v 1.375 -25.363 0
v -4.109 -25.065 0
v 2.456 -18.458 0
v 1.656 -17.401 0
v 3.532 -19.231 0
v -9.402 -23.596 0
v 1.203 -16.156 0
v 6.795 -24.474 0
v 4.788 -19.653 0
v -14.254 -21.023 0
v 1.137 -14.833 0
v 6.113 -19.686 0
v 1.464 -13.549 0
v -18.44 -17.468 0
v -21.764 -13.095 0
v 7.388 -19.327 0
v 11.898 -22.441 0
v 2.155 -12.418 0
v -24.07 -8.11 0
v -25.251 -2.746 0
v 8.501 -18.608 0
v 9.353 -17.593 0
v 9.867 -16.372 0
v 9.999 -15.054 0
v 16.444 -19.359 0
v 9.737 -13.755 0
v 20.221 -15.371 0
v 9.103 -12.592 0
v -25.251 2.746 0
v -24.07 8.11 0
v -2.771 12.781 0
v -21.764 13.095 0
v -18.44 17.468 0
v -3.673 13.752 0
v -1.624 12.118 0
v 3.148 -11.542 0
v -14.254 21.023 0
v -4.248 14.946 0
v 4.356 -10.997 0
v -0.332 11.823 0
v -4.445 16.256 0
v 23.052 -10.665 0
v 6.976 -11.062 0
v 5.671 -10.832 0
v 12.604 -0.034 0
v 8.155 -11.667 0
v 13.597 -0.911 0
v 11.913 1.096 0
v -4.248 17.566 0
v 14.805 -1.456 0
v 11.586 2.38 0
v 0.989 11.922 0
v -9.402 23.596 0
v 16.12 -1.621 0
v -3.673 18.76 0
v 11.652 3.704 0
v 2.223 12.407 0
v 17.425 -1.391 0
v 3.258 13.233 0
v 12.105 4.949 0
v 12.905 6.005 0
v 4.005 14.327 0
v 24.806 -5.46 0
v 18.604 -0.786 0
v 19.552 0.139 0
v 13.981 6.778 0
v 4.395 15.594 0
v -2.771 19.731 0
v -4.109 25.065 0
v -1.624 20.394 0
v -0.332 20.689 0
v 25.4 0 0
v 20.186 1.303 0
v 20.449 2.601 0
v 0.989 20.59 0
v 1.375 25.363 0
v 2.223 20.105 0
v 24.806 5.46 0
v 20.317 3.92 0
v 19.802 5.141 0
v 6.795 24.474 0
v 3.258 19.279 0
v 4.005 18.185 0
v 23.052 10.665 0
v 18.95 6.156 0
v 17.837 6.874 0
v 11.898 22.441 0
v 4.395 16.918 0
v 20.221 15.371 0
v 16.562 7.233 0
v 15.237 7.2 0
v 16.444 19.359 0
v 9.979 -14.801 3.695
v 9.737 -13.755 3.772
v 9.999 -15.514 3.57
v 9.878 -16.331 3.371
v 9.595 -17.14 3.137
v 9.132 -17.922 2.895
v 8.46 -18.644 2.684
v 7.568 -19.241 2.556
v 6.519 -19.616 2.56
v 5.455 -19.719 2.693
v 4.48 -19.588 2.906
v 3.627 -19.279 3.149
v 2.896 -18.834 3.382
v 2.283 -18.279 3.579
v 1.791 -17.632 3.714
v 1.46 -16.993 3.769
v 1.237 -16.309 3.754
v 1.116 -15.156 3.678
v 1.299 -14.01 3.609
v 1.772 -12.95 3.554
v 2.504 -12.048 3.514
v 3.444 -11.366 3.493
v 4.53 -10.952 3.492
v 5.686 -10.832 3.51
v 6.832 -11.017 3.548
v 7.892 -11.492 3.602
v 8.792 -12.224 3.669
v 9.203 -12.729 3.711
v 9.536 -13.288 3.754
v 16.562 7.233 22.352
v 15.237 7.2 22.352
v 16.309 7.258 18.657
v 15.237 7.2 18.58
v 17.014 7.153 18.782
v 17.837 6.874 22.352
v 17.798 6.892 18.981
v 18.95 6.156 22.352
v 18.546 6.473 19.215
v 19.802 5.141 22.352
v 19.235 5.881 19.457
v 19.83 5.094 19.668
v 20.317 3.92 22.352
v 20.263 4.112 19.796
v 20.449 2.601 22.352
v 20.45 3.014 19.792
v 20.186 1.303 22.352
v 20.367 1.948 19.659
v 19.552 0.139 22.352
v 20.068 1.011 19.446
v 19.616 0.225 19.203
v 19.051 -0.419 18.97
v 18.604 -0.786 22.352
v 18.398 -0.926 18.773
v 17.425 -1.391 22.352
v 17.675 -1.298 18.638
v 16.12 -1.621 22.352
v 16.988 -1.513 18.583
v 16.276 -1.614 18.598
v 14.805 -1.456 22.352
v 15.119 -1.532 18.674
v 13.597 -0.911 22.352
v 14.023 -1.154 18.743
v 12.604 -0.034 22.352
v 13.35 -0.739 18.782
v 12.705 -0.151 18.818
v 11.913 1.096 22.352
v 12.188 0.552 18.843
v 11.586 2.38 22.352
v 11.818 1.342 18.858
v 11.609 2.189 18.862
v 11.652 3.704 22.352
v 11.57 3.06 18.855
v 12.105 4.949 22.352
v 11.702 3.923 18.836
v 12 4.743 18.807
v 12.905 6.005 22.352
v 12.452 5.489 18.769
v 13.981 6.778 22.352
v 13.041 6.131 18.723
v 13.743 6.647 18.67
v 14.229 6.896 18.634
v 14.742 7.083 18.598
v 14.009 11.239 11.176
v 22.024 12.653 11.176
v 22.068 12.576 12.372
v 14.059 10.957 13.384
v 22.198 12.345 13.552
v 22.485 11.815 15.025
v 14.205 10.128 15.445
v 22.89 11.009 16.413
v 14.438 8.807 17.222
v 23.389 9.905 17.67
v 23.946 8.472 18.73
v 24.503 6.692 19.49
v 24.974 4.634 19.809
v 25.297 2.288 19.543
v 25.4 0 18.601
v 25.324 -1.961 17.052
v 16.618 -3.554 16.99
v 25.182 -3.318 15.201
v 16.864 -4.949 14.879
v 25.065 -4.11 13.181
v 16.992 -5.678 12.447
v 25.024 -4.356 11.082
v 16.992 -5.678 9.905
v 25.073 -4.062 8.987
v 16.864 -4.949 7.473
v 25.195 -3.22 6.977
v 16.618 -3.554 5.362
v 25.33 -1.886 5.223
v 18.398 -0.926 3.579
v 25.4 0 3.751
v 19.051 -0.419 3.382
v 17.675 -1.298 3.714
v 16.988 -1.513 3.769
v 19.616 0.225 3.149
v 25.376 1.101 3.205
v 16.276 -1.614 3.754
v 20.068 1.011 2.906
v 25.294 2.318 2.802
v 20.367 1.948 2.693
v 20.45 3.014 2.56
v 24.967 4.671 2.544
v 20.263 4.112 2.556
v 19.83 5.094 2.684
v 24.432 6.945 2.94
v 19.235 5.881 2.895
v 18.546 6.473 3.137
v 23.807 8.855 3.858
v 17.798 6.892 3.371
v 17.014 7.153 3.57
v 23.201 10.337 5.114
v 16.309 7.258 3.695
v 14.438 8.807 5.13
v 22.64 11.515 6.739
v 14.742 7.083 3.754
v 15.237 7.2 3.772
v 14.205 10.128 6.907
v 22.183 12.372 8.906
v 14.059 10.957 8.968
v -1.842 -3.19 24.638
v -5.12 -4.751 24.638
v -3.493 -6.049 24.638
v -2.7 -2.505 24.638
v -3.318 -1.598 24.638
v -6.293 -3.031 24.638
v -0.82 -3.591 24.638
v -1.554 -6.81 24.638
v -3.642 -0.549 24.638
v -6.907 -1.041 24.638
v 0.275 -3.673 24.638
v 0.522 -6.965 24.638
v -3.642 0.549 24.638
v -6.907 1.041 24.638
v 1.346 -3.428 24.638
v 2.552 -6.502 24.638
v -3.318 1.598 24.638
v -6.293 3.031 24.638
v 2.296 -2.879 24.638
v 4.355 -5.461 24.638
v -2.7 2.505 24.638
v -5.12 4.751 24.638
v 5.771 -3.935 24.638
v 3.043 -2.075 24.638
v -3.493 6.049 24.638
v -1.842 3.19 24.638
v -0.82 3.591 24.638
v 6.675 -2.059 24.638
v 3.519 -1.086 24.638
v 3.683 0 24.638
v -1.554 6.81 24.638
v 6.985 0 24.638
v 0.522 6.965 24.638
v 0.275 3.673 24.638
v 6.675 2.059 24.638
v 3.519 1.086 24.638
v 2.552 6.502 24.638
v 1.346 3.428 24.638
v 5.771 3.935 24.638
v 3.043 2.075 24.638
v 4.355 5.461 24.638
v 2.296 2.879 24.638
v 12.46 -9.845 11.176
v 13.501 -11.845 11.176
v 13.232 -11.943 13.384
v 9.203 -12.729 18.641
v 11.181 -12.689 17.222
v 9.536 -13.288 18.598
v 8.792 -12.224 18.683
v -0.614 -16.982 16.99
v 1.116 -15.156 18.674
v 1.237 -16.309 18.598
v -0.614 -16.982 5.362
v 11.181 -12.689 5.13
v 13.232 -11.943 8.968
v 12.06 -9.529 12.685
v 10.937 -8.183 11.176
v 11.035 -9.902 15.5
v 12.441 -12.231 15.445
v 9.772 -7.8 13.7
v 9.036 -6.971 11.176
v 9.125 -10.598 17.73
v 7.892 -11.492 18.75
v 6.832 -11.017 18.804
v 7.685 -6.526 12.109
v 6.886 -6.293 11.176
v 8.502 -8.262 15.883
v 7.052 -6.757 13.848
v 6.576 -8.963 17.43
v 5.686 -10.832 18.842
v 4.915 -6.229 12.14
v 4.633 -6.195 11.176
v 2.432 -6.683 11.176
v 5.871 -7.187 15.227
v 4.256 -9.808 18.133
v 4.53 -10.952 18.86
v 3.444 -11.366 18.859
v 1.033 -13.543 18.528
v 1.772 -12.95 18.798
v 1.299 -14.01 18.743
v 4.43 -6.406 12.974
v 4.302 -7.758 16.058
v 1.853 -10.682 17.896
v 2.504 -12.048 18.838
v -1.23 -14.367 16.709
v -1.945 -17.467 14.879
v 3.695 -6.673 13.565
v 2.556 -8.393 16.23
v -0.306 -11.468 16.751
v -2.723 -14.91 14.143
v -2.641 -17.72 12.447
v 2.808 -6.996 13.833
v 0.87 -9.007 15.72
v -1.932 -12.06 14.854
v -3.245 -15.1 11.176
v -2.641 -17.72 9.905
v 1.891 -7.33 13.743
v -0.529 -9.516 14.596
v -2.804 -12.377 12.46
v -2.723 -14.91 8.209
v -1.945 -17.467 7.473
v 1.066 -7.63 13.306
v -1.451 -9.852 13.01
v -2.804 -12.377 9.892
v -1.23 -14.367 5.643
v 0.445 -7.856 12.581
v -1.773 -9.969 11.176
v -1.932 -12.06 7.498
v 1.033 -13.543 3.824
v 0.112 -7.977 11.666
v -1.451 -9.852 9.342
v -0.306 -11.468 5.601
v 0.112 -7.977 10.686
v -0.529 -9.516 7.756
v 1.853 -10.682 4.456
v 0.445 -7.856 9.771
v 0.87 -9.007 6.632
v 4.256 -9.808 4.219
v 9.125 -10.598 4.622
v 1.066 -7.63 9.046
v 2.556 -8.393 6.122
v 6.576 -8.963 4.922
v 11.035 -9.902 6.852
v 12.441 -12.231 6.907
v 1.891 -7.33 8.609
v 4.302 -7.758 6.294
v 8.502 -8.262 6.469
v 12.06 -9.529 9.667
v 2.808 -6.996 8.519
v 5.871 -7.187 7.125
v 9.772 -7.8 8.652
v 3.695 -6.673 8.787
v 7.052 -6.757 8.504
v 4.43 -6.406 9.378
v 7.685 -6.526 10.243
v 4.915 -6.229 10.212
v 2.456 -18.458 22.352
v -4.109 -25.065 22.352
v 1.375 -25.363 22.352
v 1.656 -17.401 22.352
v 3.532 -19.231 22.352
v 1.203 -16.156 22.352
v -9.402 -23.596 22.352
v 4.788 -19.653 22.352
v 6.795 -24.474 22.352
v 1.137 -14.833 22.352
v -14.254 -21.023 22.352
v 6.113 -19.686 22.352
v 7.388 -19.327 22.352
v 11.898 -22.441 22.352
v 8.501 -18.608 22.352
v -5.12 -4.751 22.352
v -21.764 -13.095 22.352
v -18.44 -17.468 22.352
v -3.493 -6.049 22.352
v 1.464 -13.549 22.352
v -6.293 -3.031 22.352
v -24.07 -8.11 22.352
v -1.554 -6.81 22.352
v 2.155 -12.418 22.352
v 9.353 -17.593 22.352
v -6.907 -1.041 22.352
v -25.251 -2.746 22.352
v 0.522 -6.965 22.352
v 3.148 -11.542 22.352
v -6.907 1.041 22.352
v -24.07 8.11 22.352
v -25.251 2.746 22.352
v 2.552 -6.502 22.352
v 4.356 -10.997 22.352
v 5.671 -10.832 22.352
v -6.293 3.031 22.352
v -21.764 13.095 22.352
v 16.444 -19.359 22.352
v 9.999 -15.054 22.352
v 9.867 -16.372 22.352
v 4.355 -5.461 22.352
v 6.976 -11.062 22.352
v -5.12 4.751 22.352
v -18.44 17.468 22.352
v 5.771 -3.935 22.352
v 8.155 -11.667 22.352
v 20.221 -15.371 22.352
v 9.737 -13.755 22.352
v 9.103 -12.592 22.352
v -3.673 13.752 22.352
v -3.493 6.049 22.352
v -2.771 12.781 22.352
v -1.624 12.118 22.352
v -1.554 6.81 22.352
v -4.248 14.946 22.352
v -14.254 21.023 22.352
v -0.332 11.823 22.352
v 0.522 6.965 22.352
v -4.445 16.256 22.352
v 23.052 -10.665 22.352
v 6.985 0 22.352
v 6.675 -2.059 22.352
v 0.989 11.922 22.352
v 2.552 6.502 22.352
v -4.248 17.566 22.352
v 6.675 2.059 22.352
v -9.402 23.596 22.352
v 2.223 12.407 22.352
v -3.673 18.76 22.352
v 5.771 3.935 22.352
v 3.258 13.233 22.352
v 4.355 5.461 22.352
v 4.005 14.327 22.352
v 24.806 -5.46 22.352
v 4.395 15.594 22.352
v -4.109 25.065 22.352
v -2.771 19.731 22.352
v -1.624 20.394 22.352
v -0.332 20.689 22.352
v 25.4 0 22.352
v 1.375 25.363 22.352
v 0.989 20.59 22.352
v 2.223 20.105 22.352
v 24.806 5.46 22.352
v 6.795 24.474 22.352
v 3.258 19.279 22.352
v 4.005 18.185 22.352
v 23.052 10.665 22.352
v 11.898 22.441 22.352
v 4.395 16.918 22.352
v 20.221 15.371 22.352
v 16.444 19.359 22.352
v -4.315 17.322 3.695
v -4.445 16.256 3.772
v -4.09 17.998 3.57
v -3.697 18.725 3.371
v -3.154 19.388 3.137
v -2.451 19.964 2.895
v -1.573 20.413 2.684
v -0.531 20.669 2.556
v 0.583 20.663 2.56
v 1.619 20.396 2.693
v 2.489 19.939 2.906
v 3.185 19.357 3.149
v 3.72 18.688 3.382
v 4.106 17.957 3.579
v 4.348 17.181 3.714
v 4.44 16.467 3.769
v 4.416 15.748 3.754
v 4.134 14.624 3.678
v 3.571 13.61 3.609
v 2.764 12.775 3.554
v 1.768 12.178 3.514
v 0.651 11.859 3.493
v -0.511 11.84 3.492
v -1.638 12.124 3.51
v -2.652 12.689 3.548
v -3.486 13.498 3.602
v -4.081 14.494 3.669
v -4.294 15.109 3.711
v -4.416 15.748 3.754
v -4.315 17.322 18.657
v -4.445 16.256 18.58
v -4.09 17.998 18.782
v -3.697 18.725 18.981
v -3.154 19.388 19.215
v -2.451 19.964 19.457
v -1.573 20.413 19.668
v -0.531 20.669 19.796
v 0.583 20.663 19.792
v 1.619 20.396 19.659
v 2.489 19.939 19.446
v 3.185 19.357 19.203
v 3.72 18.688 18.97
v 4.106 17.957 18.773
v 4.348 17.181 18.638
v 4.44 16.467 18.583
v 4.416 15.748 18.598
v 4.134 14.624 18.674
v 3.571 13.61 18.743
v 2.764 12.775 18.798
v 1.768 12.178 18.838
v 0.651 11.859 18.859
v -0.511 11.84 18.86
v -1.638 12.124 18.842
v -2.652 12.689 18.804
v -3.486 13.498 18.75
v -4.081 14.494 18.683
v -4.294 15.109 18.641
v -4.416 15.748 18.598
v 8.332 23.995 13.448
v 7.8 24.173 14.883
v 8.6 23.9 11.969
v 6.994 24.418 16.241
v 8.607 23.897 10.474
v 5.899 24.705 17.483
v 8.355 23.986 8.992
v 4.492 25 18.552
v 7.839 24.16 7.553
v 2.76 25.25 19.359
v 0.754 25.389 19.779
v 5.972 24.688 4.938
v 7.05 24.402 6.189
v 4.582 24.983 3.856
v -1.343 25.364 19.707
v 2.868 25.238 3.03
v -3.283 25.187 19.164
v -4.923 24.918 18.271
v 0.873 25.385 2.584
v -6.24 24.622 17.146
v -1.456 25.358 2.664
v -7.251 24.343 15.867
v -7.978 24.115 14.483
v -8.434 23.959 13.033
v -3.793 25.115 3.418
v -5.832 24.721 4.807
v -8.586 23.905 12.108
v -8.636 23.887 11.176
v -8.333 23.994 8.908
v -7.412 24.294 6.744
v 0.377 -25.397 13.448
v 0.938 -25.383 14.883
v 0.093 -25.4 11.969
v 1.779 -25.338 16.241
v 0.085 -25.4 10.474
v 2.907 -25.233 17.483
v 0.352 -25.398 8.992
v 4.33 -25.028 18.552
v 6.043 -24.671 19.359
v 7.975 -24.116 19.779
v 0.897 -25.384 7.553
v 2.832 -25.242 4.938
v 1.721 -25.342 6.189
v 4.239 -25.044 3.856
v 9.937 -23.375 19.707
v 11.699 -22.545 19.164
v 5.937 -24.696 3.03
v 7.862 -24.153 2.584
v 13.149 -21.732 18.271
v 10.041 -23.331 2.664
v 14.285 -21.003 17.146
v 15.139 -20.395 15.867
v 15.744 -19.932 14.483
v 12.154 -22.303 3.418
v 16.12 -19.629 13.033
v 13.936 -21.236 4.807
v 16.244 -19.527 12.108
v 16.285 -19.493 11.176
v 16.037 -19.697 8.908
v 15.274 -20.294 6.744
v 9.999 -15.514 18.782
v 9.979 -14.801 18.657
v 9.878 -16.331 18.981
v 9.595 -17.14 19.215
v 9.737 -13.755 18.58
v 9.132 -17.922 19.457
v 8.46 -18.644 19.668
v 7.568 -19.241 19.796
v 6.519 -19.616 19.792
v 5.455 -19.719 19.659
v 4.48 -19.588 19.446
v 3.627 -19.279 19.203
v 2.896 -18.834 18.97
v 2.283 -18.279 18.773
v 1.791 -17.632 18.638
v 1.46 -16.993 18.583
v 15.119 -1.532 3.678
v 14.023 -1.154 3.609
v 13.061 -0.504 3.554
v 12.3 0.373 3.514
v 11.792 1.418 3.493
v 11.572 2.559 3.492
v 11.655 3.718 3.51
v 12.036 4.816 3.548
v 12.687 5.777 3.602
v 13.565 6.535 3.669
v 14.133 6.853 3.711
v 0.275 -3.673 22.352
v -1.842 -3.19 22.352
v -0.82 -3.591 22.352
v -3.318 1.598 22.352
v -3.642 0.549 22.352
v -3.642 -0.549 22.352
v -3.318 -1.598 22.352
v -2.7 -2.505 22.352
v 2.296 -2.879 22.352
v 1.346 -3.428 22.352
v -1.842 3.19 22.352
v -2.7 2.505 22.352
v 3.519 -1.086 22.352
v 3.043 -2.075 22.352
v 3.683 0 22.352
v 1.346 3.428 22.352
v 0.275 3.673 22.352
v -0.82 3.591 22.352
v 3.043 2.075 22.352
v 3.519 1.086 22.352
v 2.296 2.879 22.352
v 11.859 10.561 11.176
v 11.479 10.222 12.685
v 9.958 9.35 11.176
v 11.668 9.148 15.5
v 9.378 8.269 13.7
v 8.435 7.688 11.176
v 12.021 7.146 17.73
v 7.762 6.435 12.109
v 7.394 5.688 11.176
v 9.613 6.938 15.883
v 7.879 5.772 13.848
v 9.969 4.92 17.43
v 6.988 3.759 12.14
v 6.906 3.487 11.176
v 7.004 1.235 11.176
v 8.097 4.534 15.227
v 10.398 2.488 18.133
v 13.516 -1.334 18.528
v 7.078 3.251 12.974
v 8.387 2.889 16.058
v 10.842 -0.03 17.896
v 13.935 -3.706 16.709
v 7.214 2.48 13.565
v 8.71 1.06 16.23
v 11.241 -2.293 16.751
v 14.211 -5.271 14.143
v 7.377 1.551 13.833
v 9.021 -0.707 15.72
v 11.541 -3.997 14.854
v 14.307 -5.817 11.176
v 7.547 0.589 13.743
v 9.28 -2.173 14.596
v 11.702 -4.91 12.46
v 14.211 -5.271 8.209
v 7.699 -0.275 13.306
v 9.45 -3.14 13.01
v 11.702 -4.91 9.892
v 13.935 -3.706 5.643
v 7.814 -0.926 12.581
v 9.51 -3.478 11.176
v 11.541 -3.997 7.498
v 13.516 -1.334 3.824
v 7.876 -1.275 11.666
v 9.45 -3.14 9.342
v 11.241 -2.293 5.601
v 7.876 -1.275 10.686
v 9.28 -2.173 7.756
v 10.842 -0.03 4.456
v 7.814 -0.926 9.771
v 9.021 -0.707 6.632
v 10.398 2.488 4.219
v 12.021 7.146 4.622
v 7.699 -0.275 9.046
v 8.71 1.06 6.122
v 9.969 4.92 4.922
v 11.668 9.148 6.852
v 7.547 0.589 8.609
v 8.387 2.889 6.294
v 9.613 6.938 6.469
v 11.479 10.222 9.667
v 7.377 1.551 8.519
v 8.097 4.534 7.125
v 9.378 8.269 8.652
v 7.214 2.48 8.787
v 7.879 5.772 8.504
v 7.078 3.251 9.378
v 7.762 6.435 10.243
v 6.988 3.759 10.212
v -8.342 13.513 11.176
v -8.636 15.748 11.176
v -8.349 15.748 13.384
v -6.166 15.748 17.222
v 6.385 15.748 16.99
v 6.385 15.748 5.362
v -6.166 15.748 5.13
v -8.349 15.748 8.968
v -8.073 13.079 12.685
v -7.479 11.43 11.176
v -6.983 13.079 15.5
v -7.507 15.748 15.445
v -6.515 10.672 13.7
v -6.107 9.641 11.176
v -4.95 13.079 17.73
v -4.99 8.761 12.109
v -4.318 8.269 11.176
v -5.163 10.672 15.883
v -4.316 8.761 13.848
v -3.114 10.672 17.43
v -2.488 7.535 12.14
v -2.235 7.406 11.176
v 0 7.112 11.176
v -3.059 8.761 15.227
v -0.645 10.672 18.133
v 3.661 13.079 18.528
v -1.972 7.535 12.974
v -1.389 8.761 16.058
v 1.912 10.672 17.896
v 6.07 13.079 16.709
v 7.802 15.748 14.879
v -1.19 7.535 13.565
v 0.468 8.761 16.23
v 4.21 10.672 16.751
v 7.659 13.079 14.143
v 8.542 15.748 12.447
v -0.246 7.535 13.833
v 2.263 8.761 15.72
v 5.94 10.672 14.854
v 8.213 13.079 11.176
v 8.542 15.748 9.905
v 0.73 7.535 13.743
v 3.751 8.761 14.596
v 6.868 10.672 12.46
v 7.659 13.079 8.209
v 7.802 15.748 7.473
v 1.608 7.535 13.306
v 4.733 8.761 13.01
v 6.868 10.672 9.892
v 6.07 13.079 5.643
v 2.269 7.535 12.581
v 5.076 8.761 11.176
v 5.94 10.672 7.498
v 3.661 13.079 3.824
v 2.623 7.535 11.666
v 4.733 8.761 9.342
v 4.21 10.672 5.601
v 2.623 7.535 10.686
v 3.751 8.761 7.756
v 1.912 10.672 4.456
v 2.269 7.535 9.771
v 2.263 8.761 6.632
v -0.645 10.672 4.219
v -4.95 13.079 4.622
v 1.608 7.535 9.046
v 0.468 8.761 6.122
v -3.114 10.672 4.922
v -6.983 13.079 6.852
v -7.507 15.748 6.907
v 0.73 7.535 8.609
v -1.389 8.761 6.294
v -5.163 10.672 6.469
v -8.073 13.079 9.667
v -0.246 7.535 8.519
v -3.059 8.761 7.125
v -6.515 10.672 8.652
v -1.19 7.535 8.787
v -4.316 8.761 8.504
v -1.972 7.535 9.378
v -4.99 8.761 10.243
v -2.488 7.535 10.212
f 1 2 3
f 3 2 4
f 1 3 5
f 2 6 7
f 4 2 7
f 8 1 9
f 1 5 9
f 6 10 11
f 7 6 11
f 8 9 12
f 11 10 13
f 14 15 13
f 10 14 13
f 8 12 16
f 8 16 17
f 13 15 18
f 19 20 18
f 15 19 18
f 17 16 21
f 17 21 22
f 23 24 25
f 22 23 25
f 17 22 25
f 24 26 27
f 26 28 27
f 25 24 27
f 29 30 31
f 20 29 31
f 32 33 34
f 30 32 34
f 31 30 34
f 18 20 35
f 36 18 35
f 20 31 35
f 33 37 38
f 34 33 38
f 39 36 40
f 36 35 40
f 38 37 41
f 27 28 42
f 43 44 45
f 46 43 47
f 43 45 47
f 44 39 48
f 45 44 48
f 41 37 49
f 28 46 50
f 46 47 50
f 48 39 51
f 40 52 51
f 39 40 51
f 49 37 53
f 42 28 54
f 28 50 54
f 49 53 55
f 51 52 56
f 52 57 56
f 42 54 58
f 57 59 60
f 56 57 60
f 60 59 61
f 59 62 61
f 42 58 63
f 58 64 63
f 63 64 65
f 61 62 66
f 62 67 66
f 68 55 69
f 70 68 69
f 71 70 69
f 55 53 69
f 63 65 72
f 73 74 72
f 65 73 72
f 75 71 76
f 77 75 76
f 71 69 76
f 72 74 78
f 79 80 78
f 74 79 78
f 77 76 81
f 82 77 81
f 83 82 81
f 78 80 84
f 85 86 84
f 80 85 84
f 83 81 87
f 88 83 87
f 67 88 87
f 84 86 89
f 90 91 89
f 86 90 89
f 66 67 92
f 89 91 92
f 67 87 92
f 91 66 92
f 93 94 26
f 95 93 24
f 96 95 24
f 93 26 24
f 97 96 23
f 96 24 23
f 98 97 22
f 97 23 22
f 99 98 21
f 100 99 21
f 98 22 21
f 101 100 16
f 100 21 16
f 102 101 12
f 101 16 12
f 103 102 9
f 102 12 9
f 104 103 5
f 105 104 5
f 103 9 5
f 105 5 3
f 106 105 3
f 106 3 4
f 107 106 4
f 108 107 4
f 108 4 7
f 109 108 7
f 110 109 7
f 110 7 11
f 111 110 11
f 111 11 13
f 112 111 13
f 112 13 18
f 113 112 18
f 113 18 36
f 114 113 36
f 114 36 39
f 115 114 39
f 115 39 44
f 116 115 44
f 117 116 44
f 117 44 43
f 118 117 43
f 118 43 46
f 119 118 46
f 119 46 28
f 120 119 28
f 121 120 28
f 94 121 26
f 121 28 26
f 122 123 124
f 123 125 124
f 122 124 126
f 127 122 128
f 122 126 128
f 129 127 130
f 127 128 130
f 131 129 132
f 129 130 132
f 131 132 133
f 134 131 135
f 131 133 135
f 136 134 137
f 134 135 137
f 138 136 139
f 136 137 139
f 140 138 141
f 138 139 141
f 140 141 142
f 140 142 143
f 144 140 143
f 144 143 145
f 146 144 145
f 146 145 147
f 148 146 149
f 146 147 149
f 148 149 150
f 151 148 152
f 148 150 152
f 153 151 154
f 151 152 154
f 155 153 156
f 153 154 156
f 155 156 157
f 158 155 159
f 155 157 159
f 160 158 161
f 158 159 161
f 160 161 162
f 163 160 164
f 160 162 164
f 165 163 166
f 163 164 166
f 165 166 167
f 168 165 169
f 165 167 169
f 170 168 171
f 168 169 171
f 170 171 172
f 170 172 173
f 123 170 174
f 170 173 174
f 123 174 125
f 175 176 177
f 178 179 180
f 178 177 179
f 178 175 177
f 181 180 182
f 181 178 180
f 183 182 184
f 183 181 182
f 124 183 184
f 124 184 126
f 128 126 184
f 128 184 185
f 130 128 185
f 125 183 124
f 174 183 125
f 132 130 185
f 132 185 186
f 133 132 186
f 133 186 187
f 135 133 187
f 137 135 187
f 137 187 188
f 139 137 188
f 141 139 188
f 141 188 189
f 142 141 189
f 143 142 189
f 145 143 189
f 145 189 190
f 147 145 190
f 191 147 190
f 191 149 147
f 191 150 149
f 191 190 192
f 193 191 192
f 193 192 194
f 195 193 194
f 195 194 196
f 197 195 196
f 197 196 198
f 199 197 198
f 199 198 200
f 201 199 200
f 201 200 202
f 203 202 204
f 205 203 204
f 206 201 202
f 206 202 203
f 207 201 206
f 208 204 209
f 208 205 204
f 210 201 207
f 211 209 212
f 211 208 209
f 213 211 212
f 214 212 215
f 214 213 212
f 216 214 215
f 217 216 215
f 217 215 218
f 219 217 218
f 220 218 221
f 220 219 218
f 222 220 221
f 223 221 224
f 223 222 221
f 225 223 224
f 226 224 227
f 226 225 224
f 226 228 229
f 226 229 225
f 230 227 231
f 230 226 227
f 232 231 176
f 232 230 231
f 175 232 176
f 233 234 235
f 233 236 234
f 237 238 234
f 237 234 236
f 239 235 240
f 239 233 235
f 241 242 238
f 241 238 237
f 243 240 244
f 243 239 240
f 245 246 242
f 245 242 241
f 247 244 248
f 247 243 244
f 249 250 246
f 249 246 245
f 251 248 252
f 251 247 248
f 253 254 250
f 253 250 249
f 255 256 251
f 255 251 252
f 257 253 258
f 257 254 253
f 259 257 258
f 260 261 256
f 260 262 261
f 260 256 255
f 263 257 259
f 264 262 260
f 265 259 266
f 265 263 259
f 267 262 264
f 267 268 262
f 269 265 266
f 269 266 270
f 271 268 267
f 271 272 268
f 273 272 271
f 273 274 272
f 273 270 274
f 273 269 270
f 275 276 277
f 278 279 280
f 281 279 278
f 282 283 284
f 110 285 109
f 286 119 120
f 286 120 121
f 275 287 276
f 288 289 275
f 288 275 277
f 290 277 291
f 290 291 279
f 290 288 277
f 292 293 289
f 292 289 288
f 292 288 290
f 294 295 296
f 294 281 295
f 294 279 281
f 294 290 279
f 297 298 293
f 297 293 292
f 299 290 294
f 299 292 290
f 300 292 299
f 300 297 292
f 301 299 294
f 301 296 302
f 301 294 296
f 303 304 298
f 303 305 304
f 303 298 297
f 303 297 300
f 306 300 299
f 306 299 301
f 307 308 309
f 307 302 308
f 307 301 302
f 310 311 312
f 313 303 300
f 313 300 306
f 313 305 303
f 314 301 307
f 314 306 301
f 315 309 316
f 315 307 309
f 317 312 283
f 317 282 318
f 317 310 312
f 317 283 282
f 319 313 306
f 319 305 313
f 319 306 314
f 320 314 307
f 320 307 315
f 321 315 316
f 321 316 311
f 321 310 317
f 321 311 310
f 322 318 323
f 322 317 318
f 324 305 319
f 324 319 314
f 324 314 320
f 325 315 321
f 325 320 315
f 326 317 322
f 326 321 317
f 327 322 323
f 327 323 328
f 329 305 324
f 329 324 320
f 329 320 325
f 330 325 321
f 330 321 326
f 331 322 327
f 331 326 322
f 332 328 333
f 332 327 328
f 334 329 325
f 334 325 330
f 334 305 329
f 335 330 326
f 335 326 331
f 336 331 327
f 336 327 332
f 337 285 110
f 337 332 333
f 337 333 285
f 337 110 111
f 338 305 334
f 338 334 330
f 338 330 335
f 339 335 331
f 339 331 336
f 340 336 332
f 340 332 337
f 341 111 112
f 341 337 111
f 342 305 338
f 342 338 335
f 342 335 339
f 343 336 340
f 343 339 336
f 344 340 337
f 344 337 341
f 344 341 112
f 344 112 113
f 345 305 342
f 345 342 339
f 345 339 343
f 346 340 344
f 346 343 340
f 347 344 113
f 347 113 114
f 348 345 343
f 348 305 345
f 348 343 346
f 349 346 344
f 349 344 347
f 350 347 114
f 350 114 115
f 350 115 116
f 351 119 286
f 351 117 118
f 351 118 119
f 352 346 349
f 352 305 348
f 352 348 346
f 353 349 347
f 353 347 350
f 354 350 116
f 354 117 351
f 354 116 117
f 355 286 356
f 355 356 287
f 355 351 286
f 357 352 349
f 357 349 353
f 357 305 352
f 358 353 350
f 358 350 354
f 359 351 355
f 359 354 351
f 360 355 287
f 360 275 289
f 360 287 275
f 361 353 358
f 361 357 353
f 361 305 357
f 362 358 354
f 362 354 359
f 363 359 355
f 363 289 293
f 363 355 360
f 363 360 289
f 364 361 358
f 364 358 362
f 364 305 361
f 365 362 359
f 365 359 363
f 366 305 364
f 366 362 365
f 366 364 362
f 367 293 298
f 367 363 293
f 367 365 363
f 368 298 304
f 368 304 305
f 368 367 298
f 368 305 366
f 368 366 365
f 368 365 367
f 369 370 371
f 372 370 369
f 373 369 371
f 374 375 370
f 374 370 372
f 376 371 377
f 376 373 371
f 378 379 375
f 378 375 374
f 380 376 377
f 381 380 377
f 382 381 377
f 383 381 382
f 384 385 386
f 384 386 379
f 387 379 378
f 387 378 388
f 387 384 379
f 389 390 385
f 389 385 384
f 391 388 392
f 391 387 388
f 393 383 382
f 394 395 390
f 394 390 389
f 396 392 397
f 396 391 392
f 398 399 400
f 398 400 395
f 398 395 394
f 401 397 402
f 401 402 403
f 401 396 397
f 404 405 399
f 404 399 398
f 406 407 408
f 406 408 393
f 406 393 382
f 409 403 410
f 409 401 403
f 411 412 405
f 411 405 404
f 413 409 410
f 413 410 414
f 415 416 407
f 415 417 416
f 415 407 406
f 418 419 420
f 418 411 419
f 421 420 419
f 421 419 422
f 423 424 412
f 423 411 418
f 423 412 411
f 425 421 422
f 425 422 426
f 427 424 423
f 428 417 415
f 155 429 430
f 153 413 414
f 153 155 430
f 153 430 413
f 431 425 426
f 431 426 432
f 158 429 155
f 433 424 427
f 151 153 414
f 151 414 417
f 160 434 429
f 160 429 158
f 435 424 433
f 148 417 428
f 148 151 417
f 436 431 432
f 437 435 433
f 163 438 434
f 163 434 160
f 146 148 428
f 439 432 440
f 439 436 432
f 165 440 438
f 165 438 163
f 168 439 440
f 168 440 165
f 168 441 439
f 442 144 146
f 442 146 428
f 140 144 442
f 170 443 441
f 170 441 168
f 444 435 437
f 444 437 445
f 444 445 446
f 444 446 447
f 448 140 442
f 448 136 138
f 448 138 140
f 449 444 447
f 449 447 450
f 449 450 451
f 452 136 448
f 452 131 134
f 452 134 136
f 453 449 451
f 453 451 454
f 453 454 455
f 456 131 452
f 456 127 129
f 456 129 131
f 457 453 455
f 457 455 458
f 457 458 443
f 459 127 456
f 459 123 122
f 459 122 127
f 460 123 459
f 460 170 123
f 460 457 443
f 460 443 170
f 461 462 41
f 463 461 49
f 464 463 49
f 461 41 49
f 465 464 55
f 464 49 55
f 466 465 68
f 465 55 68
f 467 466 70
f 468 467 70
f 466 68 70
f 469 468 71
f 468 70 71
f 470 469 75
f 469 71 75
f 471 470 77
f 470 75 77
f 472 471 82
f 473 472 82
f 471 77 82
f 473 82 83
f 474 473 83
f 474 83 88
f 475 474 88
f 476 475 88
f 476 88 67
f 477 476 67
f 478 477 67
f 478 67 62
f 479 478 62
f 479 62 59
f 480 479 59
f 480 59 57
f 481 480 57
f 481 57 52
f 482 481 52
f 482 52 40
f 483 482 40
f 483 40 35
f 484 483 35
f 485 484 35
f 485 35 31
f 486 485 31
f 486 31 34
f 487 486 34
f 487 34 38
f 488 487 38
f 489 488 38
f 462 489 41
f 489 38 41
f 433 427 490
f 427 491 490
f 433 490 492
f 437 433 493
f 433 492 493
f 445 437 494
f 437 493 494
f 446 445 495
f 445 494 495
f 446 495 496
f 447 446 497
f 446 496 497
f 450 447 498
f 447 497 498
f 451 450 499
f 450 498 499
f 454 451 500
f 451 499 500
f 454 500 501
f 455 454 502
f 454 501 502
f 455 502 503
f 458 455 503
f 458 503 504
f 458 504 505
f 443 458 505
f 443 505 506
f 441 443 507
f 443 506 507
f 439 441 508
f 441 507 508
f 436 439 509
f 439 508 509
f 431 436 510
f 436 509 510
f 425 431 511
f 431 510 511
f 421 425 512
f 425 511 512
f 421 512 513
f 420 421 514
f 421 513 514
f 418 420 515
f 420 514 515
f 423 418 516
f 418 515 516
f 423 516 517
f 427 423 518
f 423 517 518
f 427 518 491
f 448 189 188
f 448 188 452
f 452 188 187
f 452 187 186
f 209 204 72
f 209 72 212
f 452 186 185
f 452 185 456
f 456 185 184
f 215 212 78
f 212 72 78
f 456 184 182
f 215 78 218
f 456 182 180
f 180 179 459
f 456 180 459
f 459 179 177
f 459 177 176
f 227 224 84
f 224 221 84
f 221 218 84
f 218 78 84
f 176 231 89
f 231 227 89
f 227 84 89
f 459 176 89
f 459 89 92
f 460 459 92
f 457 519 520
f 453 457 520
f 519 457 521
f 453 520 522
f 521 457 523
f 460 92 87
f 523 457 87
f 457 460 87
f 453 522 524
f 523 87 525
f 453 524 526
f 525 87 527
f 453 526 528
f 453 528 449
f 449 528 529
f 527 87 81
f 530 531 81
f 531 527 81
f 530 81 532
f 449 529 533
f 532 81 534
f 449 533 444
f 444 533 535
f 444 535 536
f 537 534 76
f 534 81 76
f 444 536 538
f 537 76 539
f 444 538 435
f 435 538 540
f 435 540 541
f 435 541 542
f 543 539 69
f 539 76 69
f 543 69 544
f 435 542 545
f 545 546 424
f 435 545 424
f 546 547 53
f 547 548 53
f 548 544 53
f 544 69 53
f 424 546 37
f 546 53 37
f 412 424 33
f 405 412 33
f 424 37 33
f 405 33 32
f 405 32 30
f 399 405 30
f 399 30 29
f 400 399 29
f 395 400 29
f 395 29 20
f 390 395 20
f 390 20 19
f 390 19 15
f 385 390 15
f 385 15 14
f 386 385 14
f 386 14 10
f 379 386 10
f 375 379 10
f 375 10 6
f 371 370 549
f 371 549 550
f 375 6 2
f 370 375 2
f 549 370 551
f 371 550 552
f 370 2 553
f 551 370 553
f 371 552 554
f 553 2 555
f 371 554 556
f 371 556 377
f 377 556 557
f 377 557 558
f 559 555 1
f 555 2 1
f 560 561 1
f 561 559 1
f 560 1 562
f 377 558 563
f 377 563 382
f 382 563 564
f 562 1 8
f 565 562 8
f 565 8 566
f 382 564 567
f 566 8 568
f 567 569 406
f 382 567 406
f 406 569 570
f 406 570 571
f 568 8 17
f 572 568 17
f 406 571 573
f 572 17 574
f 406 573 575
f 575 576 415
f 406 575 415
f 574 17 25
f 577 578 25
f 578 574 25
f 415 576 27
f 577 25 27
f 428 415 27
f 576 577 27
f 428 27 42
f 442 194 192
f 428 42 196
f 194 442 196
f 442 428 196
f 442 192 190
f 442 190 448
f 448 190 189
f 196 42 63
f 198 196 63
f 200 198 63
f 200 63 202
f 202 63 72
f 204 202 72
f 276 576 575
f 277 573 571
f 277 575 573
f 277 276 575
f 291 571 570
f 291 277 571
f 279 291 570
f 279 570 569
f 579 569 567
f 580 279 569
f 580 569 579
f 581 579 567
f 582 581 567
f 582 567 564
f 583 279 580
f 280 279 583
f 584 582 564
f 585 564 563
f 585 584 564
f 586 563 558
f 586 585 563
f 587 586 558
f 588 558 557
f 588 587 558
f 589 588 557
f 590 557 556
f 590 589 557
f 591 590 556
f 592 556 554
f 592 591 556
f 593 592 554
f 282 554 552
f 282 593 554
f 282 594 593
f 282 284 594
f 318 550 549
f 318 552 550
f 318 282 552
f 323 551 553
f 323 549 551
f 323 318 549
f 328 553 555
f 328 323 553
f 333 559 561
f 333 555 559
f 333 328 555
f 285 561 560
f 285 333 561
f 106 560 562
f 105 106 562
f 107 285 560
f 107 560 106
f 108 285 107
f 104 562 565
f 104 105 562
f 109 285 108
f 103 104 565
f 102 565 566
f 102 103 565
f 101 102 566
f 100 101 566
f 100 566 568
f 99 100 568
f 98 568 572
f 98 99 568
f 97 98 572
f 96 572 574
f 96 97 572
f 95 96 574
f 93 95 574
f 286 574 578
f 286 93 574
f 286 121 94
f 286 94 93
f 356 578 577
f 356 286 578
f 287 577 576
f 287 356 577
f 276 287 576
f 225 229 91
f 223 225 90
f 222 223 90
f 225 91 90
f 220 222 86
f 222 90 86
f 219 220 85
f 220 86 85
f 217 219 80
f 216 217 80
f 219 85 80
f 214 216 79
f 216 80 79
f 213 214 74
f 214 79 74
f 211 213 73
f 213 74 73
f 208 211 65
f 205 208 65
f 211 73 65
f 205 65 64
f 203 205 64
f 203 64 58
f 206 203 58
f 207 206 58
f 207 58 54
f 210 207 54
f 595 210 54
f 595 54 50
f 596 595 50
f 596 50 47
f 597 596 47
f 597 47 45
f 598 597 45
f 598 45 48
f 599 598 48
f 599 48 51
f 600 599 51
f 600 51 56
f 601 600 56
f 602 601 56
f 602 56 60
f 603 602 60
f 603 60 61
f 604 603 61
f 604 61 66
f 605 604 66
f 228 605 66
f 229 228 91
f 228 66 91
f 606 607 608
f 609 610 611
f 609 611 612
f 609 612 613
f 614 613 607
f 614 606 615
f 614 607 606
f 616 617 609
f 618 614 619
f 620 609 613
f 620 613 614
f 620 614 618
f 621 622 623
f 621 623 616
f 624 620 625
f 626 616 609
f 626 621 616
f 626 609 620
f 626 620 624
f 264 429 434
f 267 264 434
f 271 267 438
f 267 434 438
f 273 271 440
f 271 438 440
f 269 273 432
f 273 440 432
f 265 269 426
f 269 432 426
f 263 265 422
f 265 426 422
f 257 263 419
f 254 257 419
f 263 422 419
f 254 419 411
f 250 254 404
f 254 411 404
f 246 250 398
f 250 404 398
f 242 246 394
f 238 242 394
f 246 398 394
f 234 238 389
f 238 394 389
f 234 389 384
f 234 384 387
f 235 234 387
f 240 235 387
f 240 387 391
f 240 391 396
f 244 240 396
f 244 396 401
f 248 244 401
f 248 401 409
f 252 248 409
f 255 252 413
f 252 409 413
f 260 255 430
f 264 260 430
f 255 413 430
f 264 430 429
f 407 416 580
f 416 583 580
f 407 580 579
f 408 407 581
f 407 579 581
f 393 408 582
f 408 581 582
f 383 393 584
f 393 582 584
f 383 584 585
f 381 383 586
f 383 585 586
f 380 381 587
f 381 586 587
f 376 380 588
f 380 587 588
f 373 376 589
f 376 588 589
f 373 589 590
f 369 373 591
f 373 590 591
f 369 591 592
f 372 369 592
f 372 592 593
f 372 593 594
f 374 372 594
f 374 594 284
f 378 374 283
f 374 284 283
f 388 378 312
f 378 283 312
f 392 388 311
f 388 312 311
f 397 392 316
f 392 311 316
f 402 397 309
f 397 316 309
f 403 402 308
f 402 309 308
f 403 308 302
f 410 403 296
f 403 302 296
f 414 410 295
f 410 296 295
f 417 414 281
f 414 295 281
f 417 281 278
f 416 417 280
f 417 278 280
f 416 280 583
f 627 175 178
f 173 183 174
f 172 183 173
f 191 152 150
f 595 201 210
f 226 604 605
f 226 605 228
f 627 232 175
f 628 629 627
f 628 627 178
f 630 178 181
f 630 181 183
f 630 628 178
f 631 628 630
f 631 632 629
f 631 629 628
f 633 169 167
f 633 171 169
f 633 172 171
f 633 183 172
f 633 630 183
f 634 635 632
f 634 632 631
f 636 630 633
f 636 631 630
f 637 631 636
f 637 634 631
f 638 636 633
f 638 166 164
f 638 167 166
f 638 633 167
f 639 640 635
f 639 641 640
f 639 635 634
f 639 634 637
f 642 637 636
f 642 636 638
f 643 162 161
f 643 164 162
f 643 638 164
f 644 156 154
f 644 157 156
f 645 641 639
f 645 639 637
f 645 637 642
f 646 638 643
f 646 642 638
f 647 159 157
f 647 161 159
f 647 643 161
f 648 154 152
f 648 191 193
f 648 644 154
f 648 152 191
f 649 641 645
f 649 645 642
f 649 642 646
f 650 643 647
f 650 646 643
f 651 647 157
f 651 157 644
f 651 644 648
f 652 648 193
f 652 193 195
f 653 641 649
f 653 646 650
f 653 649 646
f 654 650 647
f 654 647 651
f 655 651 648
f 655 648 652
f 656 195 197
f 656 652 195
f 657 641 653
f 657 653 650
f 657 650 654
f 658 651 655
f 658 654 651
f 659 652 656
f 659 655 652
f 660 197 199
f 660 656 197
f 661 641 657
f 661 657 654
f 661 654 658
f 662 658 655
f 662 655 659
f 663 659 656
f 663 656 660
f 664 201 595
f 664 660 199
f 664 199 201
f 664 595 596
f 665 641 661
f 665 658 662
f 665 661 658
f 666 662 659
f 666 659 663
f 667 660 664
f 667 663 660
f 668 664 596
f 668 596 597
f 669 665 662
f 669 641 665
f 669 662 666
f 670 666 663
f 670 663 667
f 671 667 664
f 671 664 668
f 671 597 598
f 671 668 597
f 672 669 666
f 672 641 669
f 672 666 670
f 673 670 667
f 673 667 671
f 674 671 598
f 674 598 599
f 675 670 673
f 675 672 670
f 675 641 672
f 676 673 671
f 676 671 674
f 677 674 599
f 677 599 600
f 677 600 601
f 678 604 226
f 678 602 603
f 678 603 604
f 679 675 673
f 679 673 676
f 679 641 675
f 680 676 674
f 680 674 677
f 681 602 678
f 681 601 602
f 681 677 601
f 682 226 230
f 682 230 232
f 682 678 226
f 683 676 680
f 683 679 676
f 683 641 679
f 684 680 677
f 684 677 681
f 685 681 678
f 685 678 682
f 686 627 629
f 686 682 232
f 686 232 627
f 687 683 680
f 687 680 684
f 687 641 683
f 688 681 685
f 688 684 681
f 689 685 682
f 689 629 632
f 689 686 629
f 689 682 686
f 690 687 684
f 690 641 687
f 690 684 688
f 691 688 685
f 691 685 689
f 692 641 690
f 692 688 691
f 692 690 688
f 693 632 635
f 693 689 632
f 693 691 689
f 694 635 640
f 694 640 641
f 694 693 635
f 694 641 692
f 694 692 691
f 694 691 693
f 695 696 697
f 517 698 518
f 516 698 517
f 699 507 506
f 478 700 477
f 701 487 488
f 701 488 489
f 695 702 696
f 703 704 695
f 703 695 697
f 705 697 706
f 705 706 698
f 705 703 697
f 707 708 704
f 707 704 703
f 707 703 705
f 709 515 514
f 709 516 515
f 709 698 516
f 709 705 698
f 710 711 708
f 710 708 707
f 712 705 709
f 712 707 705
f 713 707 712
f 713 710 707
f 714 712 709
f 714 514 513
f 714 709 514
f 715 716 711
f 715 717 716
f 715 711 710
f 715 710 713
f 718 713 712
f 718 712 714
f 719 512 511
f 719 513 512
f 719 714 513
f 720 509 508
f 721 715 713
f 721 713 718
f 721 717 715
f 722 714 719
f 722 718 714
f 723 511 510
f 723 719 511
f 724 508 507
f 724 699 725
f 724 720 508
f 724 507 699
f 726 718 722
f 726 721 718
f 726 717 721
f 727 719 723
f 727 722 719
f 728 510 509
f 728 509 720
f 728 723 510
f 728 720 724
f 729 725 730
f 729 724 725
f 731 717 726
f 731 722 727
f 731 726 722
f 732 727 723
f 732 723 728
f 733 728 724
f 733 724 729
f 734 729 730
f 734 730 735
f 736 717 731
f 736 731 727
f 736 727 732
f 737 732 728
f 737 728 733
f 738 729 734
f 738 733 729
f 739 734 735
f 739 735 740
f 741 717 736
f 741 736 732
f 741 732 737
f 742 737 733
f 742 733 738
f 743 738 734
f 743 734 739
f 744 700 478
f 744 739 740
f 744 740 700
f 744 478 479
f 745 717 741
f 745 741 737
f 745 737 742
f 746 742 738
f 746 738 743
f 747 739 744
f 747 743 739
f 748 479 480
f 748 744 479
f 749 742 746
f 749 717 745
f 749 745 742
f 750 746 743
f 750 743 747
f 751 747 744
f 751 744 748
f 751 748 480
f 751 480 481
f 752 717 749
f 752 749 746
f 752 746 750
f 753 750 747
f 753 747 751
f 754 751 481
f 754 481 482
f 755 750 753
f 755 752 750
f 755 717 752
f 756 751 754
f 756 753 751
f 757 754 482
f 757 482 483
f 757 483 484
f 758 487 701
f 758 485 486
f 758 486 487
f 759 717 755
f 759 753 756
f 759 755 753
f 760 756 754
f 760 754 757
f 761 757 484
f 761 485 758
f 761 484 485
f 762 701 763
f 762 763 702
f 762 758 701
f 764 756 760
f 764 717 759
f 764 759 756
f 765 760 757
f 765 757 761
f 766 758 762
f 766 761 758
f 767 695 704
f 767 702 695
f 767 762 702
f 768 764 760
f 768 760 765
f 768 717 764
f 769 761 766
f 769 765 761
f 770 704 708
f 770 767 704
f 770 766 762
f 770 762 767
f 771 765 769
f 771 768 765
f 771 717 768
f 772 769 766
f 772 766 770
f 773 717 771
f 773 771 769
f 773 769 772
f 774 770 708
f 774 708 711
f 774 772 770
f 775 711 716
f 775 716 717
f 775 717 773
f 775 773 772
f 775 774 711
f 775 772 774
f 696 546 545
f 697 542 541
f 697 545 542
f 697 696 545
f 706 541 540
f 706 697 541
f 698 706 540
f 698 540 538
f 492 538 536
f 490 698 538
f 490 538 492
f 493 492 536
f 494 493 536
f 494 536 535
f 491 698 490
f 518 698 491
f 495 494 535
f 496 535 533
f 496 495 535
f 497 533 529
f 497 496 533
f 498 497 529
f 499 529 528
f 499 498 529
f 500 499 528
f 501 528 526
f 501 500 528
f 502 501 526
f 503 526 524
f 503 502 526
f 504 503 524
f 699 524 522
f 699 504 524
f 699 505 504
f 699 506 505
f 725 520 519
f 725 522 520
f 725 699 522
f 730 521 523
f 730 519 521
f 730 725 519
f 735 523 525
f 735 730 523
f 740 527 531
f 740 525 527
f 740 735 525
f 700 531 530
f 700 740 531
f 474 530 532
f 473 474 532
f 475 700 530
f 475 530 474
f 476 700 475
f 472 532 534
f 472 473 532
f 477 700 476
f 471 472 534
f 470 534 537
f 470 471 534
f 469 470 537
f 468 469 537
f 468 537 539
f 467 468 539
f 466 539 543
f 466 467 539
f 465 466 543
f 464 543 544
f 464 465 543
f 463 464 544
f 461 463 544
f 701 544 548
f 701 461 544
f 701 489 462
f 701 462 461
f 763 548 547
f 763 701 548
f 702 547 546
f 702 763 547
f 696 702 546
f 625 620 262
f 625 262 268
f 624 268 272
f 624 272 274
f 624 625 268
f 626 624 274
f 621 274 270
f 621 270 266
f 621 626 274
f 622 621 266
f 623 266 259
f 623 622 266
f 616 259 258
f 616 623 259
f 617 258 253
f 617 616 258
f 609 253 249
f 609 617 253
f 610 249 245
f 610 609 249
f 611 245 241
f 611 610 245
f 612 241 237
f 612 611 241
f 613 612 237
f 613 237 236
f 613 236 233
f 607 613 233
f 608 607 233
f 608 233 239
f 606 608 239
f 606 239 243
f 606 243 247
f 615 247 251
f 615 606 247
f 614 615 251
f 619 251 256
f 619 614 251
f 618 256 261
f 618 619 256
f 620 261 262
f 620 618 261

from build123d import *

# Parameters (mm, degrees)
SKETCH1_R           = 25.4
BOSS_EXTRUDE1_DEPTH = 22.352
SKETCH3_R           = 4.445
CUT_EXTRUDE1_DEPTH  = 12.1760001
CIRPATTERN1_COUNT   = 3
CIRPATTERN1_ANGLE   = 160
SKETCH4_R           = 6.985
SKETCH4_R_2         = 3.683
BOSS_EXTRUDE2_DEPTH = 2.286


with BuildPart() as part:
    # Sketch1 → Boss-Extrude1 (new body)
    with BuildSketch(Plane.XY):
        Circle(SKETCH1_R)
    extrude(amount=BOSS_EXTRUDE1_DEPTH)

    # Sketch2 → Cut-Revolve1 (revolve, cut)
    with BuildSketch(Plane(origin=(0, 0, 11.176), x_dir=(-1, 0, 0), z_dir=(0, 0, -1))):
        with BuildLine():
            Line((0, 25.4), (8.636, 25.4))
            Line((8.636, 25.4), (8.636, 15.748))
            ThreePointArc((8.636, 15.748), (6.106574162, 9.641425838), (0, 7.112))
            Line((0, 7.112), (0, 25.4))
        make_face()
    cut_revolve1 = revolve(axis=Axis((0, 0, 11.176), (0, 1, 0)), mode=Mode.SUBTRACT)

    # Sketch3 → Cut-Extrude1 (cut, symmetric)
    with BuildSketch(Plane(origin=(0, 0, 11.176), x_dir=(-1, 0, 0), z_dir=(0, 0, -1))):
        with Locations((0, 16.256)):
            Circle(SKETCH3_R)
    cut_extrude1 = extrude(amount=CUT_EXTRUDE1_DEPTH, both=True, mode=Mode.SUBTRACT)

    # CirPattern1: Cut-Revolve1, Cut-Extrude1 ×3 about axis
    cirpattern1_axis = Axis((0, 0, 0), (0, 0, -1))
    for i in range(1, CIRPATTERN1_COUNT):
        add(cut_revolve1.rotate(cirpattern1_axis, i * CIRPATTERN1_ANGLE / (CIRPATTERN1_COUNT - 1)), mode=Mode.SUBTRACT)
        add(cut_extrude1.rotate(cirpattern1_axis, i * CIRPATTERN1_ANGLE / (CIRPATTERN1_COUNT - 1)), mode=Mode.SUBTRACT)

    # Sketch4 → Boss-Extrude2 (add)
    with BuildSketch(Plane.XY.offset(22.352)):
        Circle(SKETCH4_R)
        Circle(SKETCH4_R_2, mode=Mode.SUBTRACT)
    extrude(amount=BOSS_EXTRUDE2_DEPTH)


solid = part.part
